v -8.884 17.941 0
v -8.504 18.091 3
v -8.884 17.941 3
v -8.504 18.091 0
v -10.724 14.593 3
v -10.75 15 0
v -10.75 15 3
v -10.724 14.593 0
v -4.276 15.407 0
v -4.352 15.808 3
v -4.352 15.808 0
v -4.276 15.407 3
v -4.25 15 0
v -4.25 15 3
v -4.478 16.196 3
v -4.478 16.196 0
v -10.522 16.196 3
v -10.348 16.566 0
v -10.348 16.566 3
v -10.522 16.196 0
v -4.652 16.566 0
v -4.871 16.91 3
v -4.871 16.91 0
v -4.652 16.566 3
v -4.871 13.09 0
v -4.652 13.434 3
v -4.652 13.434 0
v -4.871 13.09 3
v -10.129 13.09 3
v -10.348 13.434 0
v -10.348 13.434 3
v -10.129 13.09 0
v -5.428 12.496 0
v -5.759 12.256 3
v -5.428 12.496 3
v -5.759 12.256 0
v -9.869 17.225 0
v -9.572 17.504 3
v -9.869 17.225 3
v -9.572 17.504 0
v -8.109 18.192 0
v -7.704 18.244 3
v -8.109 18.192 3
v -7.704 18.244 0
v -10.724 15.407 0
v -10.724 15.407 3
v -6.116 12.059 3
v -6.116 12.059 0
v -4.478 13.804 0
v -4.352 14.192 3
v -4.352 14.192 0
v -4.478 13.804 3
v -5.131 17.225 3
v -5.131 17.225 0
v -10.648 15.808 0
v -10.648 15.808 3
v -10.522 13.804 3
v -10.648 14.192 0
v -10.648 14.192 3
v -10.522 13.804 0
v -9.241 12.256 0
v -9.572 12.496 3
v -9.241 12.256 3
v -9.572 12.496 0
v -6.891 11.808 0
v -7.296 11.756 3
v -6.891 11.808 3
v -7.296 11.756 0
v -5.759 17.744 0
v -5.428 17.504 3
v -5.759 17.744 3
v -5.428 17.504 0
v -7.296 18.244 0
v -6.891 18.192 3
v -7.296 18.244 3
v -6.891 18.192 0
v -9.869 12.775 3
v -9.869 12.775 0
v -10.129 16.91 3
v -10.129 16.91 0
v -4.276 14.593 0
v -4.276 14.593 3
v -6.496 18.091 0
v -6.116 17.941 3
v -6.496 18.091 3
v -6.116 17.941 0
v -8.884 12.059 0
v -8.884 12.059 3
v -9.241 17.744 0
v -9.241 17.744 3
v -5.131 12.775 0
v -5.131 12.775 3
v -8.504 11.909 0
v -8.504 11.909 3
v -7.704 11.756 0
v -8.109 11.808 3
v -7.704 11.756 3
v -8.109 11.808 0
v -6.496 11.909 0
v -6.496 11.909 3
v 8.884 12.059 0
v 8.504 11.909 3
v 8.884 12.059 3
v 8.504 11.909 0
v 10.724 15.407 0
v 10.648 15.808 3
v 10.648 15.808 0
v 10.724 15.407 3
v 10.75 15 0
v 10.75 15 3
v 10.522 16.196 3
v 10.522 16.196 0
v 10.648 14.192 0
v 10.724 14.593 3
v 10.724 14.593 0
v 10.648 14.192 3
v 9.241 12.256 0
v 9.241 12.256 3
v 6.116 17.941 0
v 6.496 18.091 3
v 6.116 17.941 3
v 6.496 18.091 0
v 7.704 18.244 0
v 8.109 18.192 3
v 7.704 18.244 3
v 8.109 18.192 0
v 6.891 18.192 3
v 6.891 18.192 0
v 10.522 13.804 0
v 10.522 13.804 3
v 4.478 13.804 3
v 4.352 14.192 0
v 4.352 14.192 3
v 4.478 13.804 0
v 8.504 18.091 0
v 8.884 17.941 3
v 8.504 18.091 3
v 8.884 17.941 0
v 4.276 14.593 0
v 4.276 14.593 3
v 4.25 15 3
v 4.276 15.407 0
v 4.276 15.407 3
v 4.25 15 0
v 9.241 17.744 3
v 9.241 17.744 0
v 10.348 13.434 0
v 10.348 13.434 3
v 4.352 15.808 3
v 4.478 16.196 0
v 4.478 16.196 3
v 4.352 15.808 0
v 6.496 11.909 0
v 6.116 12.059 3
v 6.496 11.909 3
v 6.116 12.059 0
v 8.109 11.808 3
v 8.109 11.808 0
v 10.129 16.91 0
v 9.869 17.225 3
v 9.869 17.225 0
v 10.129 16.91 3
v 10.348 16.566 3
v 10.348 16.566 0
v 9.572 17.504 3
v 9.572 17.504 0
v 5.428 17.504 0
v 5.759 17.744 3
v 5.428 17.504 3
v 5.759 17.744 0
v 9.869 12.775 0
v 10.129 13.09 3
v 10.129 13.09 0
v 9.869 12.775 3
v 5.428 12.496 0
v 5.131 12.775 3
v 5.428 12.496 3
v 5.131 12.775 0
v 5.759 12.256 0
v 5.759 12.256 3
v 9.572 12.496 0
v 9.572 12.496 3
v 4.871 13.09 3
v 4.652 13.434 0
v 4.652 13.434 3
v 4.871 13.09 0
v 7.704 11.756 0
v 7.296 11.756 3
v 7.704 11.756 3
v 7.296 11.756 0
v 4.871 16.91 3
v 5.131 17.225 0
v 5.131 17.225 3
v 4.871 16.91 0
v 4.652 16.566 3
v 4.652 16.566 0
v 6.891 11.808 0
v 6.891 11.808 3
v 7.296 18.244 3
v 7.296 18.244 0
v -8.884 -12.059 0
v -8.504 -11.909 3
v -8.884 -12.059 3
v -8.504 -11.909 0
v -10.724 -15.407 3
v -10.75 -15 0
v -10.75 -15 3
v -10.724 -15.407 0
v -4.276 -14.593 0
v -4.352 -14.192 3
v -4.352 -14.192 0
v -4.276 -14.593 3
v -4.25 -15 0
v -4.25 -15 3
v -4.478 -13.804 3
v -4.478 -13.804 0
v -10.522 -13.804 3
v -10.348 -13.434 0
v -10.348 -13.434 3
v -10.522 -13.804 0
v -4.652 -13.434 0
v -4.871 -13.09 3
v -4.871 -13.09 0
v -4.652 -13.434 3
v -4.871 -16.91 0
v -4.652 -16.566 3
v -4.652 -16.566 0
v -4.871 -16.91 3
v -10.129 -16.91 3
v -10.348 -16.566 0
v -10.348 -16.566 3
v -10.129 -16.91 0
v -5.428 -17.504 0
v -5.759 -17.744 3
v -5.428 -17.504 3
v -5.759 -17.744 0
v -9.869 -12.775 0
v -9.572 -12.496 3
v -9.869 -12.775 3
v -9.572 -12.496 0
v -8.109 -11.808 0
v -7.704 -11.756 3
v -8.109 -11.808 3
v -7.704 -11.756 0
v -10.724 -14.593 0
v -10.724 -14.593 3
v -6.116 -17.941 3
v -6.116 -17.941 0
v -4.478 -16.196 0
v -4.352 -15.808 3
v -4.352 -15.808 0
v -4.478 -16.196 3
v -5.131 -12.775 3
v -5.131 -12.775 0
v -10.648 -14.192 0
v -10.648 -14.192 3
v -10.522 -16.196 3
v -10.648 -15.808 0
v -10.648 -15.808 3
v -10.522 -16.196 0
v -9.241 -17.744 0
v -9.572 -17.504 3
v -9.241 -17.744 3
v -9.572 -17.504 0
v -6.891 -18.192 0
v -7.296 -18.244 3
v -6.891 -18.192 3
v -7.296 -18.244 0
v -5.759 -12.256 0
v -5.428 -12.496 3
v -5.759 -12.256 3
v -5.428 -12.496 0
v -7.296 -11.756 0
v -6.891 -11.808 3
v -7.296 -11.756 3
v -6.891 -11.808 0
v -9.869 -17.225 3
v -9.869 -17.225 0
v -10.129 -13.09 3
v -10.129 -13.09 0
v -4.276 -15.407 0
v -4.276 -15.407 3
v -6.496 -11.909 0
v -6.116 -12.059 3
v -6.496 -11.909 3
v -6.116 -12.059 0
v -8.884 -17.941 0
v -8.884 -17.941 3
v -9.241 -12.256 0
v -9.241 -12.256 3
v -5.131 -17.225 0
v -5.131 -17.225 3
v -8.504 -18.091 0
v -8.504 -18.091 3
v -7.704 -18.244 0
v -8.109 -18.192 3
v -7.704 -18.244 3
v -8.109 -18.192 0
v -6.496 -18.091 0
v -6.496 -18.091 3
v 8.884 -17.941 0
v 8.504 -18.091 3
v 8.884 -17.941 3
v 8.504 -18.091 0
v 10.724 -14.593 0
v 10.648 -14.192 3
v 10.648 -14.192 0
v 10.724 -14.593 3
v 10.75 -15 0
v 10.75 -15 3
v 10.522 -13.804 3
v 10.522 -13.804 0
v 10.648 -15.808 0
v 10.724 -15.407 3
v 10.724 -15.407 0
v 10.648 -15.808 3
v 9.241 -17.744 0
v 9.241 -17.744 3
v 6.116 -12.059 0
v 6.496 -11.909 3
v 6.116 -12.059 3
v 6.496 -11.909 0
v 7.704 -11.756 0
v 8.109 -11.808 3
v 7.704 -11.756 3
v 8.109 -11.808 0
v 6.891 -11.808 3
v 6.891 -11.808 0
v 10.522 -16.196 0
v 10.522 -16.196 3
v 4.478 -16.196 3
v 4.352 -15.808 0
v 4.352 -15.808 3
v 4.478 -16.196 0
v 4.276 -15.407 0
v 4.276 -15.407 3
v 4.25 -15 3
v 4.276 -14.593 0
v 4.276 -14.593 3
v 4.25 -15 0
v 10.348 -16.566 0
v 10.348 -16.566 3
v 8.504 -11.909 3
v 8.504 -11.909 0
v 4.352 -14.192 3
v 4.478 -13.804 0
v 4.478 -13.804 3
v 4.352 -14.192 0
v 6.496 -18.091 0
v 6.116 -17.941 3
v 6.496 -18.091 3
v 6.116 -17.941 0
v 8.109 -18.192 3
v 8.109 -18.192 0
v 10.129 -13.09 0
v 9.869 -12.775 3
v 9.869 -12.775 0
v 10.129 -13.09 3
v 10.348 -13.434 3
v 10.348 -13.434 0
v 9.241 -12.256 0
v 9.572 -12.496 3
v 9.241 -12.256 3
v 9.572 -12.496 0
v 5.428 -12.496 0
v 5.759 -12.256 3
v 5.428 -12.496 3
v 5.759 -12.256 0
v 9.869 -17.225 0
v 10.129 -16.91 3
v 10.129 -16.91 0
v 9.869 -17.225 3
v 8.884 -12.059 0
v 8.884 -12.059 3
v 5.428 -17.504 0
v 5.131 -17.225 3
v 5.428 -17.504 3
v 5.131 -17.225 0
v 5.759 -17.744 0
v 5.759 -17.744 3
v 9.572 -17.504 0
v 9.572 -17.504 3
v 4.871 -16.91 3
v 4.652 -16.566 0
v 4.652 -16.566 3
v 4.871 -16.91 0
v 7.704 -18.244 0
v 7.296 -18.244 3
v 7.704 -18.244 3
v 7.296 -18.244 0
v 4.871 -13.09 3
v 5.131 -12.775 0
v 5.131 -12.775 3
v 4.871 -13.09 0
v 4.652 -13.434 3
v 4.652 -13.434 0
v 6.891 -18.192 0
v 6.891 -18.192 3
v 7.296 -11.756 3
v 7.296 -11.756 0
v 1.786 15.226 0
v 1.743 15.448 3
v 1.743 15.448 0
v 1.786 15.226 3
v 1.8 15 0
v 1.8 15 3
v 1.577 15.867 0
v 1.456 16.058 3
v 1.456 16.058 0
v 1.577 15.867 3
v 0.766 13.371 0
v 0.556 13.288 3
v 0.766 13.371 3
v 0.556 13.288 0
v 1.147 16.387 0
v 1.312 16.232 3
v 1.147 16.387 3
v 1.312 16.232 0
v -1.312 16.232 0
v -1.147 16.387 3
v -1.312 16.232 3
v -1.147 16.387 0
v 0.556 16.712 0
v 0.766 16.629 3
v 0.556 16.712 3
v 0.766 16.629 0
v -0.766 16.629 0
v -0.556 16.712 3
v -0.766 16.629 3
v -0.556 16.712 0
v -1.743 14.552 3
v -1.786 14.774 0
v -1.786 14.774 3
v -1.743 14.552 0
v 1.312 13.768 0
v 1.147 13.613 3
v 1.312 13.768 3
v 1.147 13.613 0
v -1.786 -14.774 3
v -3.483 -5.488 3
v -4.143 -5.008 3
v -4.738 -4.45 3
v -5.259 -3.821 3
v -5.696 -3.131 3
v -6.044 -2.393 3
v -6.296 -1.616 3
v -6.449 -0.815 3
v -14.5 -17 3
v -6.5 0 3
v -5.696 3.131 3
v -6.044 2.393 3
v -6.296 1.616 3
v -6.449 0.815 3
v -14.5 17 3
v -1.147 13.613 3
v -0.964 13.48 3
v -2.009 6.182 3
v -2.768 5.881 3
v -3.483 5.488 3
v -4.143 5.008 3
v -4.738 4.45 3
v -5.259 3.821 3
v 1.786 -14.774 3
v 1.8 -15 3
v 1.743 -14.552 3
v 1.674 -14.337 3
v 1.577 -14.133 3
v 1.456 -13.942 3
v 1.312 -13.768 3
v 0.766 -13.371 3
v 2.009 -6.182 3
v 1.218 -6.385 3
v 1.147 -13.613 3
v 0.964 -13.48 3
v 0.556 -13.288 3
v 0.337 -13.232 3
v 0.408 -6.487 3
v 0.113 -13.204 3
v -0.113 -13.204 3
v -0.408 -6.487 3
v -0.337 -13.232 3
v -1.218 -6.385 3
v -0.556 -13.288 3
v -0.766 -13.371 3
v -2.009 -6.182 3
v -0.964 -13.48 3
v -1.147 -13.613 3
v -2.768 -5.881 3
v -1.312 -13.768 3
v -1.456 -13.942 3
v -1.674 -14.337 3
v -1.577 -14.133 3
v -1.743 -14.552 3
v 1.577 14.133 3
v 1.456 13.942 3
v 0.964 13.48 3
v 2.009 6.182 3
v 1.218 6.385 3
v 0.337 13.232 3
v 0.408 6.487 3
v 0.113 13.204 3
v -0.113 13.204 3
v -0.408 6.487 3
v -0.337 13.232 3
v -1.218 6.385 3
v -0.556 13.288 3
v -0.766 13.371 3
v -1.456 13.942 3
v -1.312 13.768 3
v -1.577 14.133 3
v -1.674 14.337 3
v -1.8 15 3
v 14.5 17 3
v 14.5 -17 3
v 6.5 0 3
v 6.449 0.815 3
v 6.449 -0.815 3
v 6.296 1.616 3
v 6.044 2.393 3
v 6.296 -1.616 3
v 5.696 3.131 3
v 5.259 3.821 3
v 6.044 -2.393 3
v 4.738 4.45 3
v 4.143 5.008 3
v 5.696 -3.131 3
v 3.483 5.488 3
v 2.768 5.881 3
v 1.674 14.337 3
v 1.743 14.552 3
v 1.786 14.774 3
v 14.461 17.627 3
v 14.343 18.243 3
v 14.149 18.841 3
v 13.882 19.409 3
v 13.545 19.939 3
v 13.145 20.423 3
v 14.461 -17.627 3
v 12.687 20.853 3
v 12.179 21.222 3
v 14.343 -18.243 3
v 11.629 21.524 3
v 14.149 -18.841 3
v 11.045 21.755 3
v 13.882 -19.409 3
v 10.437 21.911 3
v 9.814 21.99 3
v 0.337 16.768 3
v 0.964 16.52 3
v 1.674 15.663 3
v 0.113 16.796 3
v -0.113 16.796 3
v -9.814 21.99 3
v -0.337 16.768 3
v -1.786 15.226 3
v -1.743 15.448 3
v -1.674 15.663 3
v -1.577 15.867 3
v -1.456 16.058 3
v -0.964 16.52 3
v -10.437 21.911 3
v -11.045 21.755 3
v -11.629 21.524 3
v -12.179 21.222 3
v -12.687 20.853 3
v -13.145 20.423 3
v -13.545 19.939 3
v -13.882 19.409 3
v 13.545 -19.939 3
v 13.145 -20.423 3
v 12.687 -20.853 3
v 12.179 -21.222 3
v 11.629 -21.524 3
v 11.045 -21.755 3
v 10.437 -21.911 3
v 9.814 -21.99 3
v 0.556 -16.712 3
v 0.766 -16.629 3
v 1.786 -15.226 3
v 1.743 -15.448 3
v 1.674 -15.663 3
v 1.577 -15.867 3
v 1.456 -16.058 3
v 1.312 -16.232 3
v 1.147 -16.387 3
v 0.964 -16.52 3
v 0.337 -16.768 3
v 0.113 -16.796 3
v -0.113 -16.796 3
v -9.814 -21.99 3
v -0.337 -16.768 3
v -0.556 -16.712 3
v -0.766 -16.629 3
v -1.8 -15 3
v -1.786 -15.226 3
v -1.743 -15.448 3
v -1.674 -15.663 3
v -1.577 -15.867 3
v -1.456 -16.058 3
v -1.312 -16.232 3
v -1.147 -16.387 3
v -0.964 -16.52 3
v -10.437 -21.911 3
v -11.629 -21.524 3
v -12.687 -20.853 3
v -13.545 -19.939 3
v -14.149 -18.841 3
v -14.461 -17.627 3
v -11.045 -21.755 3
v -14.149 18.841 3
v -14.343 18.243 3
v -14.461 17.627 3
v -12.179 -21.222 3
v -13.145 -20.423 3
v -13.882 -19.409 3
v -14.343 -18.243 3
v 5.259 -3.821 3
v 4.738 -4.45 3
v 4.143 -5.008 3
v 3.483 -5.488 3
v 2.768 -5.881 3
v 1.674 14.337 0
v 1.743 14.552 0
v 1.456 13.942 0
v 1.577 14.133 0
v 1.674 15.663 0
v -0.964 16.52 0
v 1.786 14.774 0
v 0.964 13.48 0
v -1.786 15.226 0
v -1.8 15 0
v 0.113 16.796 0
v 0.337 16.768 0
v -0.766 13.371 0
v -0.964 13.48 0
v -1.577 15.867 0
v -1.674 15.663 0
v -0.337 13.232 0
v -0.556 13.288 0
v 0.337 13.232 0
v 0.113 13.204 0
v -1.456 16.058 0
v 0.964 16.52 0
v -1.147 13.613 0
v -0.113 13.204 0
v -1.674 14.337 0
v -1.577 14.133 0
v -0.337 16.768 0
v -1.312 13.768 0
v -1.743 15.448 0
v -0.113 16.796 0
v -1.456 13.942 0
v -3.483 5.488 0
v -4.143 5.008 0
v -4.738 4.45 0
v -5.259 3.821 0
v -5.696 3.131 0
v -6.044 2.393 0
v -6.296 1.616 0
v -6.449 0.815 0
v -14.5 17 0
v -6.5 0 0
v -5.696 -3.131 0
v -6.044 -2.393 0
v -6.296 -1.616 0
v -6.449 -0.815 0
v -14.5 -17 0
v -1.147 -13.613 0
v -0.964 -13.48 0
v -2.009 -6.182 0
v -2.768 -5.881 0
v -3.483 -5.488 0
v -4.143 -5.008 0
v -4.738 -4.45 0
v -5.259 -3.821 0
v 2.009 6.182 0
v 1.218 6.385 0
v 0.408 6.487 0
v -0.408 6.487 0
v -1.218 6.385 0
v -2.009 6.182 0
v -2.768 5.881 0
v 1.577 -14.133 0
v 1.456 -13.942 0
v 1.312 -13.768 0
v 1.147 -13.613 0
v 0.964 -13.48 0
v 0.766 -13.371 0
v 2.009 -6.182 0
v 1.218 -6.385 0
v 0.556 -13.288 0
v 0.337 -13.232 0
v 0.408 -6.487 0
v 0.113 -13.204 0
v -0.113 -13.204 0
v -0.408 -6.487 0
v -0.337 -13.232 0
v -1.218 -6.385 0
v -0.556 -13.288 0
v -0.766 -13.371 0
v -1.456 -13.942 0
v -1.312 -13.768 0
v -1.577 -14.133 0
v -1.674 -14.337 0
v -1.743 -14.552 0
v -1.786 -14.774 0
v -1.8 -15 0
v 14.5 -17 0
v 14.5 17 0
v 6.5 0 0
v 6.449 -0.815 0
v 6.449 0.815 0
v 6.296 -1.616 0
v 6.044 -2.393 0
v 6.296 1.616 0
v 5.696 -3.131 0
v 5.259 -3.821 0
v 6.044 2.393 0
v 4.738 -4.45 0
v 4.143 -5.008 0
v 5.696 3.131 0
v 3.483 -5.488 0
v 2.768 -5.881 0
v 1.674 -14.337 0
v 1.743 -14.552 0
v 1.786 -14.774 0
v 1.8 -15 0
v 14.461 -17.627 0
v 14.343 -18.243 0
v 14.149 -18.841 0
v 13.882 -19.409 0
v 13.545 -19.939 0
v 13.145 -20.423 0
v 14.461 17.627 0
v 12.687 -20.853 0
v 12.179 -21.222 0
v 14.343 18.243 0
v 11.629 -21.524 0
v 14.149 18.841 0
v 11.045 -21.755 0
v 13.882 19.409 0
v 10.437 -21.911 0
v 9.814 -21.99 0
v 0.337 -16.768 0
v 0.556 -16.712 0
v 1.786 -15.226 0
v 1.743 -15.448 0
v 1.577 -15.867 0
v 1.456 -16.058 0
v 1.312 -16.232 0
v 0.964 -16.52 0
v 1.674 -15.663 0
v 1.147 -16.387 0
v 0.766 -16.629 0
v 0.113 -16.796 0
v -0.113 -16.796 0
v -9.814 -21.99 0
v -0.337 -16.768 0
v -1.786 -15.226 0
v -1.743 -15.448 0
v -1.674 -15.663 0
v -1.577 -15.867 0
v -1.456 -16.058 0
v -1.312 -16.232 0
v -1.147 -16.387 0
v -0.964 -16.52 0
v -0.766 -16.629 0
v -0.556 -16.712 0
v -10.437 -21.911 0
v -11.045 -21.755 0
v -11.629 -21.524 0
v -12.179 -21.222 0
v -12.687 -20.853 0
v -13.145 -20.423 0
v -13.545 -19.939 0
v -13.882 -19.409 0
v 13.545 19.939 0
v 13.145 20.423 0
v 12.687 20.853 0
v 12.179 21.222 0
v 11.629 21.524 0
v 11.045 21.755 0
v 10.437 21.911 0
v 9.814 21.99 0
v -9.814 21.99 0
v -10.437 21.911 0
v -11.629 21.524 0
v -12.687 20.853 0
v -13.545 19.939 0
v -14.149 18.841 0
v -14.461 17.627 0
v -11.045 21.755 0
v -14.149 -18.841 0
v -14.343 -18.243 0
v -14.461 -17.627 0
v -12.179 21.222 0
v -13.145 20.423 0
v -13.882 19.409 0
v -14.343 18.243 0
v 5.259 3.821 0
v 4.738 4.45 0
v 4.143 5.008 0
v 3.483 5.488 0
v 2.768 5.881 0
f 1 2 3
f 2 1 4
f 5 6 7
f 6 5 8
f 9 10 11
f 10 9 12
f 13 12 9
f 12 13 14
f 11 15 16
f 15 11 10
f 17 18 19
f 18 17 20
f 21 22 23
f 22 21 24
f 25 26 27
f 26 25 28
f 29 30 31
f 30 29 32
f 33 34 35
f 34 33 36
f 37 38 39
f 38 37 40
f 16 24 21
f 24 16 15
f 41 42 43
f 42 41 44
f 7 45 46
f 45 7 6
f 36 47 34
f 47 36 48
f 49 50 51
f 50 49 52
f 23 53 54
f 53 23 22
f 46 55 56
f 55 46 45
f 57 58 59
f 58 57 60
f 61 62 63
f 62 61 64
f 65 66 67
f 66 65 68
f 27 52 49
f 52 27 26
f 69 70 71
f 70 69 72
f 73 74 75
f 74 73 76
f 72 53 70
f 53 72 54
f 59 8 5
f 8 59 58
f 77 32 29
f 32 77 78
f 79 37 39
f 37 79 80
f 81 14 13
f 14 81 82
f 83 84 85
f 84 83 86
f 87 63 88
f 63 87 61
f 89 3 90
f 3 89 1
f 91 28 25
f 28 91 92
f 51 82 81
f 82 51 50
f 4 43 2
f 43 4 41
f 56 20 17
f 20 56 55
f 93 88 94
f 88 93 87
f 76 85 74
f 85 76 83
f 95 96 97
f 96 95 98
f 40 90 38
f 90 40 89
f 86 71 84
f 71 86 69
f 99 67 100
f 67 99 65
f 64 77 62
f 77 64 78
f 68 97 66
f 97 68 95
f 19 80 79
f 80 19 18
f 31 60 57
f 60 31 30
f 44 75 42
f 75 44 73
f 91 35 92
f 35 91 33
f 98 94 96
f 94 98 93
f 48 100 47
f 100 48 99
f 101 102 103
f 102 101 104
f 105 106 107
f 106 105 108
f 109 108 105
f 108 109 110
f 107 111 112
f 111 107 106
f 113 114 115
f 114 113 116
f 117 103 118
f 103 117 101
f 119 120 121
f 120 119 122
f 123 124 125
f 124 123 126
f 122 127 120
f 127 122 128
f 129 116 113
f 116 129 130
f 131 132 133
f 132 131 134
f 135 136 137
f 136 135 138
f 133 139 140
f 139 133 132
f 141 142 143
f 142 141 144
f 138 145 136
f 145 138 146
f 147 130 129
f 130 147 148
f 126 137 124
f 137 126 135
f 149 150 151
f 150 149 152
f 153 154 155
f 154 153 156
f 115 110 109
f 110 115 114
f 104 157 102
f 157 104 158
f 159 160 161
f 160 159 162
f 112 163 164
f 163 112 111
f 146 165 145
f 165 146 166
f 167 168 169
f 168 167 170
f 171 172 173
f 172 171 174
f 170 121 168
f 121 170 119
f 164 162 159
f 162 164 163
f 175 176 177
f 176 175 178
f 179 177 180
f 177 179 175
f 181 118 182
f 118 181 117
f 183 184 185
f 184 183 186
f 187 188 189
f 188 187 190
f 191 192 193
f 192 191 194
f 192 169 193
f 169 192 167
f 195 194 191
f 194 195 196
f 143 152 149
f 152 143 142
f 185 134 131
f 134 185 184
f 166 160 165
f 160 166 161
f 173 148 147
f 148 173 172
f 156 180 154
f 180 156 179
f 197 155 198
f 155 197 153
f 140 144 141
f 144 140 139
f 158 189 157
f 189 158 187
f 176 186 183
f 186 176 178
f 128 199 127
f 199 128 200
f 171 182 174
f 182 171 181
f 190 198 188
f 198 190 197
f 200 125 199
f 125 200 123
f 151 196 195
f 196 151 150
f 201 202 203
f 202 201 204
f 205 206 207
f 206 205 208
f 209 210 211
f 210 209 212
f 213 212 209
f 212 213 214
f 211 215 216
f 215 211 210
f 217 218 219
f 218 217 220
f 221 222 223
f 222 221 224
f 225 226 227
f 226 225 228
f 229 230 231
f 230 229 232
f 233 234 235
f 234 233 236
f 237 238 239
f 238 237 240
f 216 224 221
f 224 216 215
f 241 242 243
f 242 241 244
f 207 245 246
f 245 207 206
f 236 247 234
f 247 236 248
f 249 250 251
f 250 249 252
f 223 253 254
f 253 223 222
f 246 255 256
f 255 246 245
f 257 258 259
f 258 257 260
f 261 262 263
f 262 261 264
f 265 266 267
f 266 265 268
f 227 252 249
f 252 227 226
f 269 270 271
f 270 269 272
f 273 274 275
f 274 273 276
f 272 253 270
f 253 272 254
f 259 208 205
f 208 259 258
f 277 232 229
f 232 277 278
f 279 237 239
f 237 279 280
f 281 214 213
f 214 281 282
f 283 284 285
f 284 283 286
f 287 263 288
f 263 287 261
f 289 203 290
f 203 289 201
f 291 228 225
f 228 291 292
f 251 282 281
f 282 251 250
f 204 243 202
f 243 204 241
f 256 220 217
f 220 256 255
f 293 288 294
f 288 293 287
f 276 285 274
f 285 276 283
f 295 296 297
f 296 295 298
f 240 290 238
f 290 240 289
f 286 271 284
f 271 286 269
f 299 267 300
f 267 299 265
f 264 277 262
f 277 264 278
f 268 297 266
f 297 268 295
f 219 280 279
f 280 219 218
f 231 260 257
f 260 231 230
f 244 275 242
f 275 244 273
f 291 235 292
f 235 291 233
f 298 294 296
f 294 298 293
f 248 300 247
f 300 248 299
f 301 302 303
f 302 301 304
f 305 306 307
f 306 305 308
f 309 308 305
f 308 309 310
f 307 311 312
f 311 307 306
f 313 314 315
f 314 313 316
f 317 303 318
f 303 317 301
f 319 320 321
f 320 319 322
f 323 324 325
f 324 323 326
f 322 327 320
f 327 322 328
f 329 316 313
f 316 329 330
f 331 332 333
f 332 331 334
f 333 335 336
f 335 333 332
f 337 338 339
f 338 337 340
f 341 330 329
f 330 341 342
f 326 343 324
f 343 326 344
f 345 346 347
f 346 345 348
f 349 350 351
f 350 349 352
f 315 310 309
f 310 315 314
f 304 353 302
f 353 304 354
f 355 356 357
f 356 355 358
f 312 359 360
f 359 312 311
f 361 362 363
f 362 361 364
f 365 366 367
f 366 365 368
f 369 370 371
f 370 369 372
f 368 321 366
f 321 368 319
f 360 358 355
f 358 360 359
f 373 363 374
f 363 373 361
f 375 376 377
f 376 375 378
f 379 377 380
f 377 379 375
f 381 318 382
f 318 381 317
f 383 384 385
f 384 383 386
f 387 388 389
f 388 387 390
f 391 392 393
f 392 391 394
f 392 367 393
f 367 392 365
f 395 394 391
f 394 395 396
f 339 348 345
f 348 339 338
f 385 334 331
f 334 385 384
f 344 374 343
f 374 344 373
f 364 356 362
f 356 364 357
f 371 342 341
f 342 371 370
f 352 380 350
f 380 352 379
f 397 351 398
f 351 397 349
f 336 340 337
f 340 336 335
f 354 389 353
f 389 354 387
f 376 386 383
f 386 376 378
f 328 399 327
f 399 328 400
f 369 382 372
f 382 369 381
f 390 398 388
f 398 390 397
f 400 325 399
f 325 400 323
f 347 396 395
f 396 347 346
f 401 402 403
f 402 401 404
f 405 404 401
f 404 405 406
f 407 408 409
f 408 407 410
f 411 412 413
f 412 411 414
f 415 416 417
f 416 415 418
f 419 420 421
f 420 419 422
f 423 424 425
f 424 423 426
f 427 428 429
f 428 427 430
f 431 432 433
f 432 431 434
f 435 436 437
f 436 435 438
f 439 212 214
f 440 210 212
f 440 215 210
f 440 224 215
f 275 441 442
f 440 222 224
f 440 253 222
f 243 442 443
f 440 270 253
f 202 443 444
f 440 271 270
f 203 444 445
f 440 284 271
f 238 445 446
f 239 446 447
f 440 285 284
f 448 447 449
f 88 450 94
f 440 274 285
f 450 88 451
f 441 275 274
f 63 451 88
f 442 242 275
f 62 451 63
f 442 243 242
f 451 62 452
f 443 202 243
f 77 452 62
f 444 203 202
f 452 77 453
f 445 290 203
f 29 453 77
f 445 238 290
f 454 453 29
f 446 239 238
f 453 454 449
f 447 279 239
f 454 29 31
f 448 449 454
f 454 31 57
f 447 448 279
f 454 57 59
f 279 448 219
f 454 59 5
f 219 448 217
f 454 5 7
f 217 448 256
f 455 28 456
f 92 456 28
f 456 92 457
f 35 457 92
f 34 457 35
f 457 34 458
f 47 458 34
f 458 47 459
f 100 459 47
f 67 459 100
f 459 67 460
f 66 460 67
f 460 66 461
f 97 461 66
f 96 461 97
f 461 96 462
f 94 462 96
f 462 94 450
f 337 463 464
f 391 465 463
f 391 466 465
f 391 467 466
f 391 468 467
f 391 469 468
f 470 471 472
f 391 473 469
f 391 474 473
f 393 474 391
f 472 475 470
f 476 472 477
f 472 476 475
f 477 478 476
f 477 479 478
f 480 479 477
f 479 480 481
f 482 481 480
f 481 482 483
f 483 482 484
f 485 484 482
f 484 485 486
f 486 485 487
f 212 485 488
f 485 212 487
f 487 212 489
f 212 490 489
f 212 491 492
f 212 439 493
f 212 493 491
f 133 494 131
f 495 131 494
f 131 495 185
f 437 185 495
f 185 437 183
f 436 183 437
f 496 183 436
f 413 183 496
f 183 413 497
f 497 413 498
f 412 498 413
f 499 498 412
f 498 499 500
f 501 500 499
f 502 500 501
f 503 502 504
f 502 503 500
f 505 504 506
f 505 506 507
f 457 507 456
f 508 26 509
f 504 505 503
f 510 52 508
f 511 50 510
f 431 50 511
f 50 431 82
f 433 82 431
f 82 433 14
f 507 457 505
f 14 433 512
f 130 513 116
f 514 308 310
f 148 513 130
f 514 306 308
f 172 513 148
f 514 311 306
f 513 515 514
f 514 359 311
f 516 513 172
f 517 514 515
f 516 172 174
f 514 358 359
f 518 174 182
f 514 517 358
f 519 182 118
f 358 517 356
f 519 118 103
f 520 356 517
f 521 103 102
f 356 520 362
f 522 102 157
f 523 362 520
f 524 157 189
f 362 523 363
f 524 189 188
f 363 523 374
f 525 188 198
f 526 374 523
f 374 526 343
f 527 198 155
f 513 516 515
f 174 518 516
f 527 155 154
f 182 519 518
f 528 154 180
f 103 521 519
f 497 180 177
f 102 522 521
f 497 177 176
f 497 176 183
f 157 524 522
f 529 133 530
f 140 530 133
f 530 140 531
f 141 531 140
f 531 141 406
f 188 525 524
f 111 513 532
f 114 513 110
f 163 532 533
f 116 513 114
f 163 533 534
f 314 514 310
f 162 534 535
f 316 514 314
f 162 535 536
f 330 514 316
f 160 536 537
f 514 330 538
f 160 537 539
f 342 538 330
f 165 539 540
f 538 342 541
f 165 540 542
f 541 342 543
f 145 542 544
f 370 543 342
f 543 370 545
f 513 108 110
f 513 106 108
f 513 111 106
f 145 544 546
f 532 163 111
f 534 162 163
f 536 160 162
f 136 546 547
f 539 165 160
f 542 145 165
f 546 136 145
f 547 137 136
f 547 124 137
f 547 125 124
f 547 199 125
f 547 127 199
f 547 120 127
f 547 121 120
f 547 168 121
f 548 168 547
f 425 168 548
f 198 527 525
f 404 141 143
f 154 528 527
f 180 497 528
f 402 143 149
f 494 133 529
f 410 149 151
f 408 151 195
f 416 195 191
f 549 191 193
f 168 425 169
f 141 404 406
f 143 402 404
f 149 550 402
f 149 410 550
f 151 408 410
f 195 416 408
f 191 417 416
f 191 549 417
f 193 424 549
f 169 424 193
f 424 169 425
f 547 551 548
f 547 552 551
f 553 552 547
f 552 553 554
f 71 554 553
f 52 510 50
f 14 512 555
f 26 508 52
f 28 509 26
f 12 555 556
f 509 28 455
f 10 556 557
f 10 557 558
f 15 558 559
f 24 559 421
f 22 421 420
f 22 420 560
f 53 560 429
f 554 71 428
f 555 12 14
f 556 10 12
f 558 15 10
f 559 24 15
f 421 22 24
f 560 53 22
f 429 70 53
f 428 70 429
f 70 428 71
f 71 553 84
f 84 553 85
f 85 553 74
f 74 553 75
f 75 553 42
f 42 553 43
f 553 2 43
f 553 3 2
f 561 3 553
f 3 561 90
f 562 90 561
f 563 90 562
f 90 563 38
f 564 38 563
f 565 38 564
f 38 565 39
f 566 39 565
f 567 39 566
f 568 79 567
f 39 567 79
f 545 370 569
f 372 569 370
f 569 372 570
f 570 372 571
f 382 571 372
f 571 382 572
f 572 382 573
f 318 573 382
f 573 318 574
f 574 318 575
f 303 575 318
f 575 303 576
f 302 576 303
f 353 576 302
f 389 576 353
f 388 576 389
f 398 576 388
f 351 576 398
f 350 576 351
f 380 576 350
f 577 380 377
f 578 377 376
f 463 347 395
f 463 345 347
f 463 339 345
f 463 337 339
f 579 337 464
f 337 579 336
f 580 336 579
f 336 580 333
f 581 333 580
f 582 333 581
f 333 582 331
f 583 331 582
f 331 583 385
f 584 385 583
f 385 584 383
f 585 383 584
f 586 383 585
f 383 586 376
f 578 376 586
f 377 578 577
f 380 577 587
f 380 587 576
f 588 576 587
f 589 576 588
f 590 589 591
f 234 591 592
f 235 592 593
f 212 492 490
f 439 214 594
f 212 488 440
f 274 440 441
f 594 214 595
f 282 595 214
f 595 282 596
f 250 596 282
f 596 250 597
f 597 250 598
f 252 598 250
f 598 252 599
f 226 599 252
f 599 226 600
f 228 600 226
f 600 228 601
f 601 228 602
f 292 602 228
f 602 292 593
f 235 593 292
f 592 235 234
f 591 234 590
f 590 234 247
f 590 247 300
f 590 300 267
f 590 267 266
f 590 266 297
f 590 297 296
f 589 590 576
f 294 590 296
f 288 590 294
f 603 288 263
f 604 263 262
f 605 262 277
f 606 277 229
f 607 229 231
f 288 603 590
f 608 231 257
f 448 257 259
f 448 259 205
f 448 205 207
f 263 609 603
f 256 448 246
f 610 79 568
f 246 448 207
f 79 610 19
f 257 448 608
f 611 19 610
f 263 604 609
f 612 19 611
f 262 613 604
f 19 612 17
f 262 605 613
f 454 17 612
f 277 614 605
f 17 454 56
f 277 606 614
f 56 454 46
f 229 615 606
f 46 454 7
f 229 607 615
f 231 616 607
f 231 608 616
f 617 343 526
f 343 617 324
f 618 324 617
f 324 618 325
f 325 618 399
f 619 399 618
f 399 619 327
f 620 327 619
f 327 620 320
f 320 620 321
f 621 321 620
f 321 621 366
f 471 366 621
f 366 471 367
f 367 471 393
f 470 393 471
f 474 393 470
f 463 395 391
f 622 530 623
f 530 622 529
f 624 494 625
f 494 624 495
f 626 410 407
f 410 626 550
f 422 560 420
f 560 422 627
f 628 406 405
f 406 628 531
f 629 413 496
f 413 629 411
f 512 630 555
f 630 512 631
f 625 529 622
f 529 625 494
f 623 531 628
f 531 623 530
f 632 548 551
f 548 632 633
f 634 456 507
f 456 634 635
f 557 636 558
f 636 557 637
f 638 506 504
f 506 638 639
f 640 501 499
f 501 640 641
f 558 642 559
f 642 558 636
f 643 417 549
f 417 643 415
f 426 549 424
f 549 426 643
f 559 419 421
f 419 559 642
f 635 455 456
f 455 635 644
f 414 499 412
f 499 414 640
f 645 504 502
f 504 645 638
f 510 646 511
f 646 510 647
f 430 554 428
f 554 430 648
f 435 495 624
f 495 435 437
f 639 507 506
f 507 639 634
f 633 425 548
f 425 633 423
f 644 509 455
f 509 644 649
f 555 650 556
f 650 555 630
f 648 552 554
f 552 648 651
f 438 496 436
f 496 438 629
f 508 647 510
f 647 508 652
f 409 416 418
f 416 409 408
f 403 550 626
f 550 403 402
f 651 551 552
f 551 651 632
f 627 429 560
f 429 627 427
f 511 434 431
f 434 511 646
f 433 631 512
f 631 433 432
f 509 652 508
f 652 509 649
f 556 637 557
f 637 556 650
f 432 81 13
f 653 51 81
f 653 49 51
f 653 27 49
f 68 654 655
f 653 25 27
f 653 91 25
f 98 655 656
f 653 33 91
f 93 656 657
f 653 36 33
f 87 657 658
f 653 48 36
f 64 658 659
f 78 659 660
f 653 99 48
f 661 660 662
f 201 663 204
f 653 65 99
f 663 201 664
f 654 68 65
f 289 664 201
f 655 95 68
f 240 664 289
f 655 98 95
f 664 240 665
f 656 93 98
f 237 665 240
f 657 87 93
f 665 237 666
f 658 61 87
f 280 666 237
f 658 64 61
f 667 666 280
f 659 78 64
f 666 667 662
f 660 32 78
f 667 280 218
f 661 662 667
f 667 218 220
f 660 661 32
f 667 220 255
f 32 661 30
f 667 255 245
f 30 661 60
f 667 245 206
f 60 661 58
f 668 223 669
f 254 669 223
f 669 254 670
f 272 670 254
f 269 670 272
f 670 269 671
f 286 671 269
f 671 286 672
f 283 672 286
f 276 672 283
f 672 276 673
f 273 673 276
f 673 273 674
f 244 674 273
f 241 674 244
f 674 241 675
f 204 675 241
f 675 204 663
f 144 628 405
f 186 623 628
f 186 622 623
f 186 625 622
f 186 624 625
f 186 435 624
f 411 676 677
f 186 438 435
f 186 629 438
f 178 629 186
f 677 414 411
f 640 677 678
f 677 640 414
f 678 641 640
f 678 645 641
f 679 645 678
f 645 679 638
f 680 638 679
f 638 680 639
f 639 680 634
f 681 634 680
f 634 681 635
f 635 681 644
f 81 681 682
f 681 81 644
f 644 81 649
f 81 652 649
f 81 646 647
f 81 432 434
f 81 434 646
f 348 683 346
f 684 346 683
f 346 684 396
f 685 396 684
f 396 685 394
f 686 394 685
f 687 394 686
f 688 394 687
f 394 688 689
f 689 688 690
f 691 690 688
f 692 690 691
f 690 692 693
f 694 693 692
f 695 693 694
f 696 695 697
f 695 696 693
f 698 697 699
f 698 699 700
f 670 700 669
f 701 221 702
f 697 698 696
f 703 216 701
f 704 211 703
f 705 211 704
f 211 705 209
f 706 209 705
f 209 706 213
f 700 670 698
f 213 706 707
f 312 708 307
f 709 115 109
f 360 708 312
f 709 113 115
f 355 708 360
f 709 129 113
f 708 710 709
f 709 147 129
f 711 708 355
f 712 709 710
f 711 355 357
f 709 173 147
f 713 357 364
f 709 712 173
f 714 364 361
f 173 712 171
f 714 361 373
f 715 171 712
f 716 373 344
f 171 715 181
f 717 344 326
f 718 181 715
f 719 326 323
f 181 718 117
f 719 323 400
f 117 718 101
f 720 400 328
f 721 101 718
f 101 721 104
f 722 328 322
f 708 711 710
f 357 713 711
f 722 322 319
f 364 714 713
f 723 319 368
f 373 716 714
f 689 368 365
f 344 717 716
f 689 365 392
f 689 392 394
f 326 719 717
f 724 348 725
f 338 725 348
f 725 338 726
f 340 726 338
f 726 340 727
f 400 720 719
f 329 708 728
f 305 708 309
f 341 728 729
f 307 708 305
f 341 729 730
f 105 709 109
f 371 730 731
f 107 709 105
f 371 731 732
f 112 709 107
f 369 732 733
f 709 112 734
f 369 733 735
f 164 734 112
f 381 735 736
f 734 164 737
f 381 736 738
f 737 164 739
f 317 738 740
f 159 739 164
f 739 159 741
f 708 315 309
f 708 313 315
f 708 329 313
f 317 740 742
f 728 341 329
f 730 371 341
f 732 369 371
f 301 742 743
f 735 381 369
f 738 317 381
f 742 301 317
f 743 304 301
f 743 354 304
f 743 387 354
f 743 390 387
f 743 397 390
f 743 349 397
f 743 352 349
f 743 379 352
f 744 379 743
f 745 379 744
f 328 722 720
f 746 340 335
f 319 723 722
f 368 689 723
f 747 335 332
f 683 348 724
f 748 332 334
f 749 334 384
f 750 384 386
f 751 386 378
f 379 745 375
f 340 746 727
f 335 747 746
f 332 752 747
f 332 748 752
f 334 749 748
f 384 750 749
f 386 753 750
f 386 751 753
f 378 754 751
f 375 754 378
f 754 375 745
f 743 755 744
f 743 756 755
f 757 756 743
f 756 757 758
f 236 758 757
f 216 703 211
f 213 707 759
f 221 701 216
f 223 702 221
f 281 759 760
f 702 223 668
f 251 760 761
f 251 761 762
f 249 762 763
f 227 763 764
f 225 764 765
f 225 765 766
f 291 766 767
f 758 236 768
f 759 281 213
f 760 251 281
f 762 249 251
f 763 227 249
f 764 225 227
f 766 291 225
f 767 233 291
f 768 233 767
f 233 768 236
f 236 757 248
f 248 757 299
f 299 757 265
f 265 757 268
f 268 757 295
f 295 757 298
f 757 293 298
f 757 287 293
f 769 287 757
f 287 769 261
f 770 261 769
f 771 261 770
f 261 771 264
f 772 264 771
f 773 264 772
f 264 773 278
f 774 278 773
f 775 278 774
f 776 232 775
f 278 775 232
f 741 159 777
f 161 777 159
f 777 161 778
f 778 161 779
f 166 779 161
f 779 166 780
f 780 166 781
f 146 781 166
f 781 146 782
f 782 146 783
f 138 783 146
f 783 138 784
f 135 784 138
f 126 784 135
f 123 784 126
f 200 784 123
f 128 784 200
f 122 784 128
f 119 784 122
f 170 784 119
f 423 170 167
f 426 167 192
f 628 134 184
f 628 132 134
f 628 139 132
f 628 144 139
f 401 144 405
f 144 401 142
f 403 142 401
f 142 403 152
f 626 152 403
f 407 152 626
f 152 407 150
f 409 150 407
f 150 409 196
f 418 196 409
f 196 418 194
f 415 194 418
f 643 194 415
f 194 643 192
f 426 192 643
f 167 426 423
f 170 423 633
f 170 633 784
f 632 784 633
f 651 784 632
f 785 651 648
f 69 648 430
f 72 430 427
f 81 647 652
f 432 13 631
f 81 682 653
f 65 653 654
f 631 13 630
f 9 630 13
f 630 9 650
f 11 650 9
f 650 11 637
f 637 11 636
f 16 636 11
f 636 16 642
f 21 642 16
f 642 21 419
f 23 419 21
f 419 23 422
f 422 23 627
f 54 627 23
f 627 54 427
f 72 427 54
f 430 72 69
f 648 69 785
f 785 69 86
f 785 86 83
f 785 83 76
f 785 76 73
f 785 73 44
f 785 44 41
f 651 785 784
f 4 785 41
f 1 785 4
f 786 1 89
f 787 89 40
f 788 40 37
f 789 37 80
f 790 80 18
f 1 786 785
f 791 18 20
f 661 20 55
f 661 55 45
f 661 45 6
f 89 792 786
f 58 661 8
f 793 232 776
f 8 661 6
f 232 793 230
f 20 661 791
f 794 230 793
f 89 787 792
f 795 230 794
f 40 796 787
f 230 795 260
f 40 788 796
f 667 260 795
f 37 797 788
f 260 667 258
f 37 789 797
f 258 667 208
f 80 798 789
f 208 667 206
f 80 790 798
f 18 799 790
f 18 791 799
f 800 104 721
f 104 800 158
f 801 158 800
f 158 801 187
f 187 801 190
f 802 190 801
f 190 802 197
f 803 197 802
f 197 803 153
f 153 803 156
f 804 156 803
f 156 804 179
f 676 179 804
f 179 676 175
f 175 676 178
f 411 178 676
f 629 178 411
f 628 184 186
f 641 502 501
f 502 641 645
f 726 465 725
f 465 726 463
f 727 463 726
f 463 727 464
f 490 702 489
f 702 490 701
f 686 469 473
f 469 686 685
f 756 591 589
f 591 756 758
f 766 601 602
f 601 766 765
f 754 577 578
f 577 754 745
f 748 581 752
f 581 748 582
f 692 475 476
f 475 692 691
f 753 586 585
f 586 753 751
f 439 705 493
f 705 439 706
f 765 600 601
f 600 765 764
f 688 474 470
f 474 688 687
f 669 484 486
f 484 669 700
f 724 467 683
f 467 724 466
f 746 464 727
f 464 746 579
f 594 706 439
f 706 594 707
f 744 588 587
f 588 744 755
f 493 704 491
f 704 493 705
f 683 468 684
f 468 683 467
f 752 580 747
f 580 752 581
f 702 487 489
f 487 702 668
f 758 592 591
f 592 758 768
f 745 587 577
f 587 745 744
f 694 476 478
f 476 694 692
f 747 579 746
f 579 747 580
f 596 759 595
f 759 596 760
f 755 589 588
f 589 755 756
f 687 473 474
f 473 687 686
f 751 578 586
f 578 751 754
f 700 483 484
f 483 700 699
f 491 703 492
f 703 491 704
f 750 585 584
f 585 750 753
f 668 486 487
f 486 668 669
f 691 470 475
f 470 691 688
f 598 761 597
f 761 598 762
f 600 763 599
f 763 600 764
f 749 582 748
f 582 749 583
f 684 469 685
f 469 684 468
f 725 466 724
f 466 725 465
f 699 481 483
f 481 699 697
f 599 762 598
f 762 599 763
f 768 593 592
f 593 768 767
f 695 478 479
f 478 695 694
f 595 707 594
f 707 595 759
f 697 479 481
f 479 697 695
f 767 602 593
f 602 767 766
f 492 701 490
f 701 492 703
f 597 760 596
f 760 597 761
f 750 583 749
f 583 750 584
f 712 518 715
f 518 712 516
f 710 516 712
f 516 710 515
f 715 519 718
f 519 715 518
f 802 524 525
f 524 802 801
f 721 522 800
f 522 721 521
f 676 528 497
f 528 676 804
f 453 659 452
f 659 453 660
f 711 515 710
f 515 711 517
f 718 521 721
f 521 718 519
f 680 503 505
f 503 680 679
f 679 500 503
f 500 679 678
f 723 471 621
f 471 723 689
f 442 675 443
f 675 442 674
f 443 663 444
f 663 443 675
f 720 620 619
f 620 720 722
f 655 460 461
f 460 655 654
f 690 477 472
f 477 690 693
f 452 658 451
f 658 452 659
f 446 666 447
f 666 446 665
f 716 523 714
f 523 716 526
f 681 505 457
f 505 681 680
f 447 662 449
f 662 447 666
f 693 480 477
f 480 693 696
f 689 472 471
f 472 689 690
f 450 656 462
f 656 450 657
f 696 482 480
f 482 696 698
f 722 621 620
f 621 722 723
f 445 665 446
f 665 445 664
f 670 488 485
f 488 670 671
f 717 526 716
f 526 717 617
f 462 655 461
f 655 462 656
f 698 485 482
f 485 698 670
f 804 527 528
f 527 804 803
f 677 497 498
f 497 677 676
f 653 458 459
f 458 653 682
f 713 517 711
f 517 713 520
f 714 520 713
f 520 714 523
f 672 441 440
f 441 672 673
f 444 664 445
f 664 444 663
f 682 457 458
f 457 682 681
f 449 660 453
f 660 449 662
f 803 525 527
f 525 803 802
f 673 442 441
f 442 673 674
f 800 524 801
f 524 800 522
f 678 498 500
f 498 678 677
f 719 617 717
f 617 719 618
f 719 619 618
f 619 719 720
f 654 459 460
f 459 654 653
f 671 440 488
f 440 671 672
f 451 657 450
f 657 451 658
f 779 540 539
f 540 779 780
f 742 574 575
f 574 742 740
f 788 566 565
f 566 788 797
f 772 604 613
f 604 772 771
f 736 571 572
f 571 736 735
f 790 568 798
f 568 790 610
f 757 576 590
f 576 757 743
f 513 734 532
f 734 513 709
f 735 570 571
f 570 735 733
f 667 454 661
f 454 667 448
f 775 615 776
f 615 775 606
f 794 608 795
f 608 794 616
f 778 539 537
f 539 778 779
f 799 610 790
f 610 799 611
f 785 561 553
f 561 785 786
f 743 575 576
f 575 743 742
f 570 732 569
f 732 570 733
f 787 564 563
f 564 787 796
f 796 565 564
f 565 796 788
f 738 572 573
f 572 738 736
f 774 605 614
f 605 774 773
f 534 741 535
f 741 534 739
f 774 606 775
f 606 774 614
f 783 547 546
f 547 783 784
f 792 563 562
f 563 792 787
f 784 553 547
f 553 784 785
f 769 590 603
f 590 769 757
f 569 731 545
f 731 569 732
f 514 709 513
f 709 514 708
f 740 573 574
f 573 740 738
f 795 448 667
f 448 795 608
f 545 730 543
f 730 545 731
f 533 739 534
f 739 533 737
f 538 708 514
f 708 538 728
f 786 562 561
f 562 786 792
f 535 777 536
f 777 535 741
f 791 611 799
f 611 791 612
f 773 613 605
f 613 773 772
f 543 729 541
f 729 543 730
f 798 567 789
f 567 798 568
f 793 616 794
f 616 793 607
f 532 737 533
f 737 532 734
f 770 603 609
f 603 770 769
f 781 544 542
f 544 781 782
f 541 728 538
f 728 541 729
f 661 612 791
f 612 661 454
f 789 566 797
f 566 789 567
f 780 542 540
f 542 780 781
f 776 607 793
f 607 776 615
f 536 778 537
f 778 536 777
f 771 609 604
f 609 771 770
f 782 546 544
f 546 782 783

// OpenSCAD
$fn = 50;


difference() {
	union() {
		hull() {
			translate(v = [-9.5000000000, 17.0000000000, 0]) {
				cylinder(h = 3, r = 5);
			}
			translate(v = [9.5000000000, 17.0000000000, 0]) {
				cylinder(h = 3, r = 5);
			}
			translate(v = [-9.5000000000, -17.0000000000, 0]) {
				cylinder(h = 3, r = 5);
			}
			translate(v = [9.5000000000, -17.0000000000, 0]) {
				cylinder(h = 3, r = 5);
			}
		}
	}
	union() {
		#translate(v = [-7.5000000000, 15.0000000000, 0]) {
			cylinder(h = 3, r = 3.2500000000);
		}
		#translate(v = [7.5000000000, 15.0000000000, 0]) {
			cylinder(h = 3, r = 3.2500000000);
		}
		#translate(v = [-7.5000000000, -15.0000000000, 0]) {
			cylinder(h = 3, r = 3.2500000000);
		}
		#translate(v = [7.5000000000, -15.0000000000, 0]) {
			cylinder(h = 3, r = 3.2500000000);
		}
		#translate(v = [-7.5000000000, -15.0000000000, -100.0000000000]) {
			cylinder(h = 200, r = 3.2500000000);
		}
		#translate(v = [-7.5000000000, 15.0000000000, -100.0000000000]) {
			cylinder(h = 200, r = 3.2500000000);
		}
		#translate(v = [7.5000000000, -15.0000000000, -100.0000000000]) {
			cylinder(h = 200, r = 3.2500000000);
		}
		#translate(v = [7.5000000000, 15.0000000000, -100.0000000000]) {
			cylinder(h = 200, r = 3.2500000000);
		}
		#translate(v = [-7.5000000000, 15.0000000000, 0]) {
			cylinder(h = 3, r = 1.8000000000);
		}
		#translate(v = [0.0000000000, 15.0000000000, 0]) {
			cylinder(h = 3, r = 1.8000000000);
		}
		#translate(v = [7.5000000000, 15.0000000000, 0]) {
			cylinder(h = 3, r = 1.8000000000);
		}
		#translate(v = [-7.5000000000, -15.0000000000, 0]) {
			cylinder(h = 3, r = 1.8000000000);
		}
		#translate(v = [0.0000000000, -15.0000000000, 0]) {
			cylinder(h = 3, r = 1.8000000000);
		}
		#translate(v = [7.5000000000, -15.0000000000, 0]) {
			cylinder(h = 3, r = 1.8000000000);
		}
		#translate(v = [-7.5000000000, 15.0000000000, 0]) {
			cylinder(h = 3, r = 1.8000000000);
		}
		#translate(v = [0.0000000000, 15.0000000000, 0]) {
			cylinder(h = 3, r = 1.8000000000);
		}
		#translate(v = [7.5000000000, 15.0000000000, 0]) {
			cylinder(h = 3, r = 1.8000000000);
		}
		#translate(v = [-7.5000000000, -15.0000000000, 0]) {
			cylinder(h = 3, r = 1.8000000000);
		}
		#translate(v = [0.0000000000, -15.0000000000, 0]) {
			cylinder(h = 3, r = 1.8000000000);
		}
		#translate(v = [7.5000000000, -15.0000000000, 0]) {
			cylinder(h = 3, r = 1.8000000000);
		}
		#translate(v = [-7.5000000000, 15.0000000000, 0]) {
			cylinder(h = 3, r = 1.8000000000);
		}
		#translate(v = [0.0000000000, 15.0000000000, 0]) {
			cylinder(h = 3, r = 1.8000000000);
		}
		#translate(v = [7.5000000000, 15.0000000000, 0]) {
			cylinder(h = 3, r = 1.8000000000);
		}
		#translate(v = [-7.5000000000, -15.0000000000, 0]) {
			cylinder(h = 3, r = 1.8000000000);
		}
		#translate(v = [0.0000000000, -15.0000000000, 0]) {
			cylinder(h = 3, r = 1.8000000000);
		}
		#translate(v = [7.5000000000, -15.0000000000, 0]) {
			cylinder(h = 3, r = 1.8000000000);
		}
		#cylinder(h = 3, r = 6.5000000000);
	}
}
